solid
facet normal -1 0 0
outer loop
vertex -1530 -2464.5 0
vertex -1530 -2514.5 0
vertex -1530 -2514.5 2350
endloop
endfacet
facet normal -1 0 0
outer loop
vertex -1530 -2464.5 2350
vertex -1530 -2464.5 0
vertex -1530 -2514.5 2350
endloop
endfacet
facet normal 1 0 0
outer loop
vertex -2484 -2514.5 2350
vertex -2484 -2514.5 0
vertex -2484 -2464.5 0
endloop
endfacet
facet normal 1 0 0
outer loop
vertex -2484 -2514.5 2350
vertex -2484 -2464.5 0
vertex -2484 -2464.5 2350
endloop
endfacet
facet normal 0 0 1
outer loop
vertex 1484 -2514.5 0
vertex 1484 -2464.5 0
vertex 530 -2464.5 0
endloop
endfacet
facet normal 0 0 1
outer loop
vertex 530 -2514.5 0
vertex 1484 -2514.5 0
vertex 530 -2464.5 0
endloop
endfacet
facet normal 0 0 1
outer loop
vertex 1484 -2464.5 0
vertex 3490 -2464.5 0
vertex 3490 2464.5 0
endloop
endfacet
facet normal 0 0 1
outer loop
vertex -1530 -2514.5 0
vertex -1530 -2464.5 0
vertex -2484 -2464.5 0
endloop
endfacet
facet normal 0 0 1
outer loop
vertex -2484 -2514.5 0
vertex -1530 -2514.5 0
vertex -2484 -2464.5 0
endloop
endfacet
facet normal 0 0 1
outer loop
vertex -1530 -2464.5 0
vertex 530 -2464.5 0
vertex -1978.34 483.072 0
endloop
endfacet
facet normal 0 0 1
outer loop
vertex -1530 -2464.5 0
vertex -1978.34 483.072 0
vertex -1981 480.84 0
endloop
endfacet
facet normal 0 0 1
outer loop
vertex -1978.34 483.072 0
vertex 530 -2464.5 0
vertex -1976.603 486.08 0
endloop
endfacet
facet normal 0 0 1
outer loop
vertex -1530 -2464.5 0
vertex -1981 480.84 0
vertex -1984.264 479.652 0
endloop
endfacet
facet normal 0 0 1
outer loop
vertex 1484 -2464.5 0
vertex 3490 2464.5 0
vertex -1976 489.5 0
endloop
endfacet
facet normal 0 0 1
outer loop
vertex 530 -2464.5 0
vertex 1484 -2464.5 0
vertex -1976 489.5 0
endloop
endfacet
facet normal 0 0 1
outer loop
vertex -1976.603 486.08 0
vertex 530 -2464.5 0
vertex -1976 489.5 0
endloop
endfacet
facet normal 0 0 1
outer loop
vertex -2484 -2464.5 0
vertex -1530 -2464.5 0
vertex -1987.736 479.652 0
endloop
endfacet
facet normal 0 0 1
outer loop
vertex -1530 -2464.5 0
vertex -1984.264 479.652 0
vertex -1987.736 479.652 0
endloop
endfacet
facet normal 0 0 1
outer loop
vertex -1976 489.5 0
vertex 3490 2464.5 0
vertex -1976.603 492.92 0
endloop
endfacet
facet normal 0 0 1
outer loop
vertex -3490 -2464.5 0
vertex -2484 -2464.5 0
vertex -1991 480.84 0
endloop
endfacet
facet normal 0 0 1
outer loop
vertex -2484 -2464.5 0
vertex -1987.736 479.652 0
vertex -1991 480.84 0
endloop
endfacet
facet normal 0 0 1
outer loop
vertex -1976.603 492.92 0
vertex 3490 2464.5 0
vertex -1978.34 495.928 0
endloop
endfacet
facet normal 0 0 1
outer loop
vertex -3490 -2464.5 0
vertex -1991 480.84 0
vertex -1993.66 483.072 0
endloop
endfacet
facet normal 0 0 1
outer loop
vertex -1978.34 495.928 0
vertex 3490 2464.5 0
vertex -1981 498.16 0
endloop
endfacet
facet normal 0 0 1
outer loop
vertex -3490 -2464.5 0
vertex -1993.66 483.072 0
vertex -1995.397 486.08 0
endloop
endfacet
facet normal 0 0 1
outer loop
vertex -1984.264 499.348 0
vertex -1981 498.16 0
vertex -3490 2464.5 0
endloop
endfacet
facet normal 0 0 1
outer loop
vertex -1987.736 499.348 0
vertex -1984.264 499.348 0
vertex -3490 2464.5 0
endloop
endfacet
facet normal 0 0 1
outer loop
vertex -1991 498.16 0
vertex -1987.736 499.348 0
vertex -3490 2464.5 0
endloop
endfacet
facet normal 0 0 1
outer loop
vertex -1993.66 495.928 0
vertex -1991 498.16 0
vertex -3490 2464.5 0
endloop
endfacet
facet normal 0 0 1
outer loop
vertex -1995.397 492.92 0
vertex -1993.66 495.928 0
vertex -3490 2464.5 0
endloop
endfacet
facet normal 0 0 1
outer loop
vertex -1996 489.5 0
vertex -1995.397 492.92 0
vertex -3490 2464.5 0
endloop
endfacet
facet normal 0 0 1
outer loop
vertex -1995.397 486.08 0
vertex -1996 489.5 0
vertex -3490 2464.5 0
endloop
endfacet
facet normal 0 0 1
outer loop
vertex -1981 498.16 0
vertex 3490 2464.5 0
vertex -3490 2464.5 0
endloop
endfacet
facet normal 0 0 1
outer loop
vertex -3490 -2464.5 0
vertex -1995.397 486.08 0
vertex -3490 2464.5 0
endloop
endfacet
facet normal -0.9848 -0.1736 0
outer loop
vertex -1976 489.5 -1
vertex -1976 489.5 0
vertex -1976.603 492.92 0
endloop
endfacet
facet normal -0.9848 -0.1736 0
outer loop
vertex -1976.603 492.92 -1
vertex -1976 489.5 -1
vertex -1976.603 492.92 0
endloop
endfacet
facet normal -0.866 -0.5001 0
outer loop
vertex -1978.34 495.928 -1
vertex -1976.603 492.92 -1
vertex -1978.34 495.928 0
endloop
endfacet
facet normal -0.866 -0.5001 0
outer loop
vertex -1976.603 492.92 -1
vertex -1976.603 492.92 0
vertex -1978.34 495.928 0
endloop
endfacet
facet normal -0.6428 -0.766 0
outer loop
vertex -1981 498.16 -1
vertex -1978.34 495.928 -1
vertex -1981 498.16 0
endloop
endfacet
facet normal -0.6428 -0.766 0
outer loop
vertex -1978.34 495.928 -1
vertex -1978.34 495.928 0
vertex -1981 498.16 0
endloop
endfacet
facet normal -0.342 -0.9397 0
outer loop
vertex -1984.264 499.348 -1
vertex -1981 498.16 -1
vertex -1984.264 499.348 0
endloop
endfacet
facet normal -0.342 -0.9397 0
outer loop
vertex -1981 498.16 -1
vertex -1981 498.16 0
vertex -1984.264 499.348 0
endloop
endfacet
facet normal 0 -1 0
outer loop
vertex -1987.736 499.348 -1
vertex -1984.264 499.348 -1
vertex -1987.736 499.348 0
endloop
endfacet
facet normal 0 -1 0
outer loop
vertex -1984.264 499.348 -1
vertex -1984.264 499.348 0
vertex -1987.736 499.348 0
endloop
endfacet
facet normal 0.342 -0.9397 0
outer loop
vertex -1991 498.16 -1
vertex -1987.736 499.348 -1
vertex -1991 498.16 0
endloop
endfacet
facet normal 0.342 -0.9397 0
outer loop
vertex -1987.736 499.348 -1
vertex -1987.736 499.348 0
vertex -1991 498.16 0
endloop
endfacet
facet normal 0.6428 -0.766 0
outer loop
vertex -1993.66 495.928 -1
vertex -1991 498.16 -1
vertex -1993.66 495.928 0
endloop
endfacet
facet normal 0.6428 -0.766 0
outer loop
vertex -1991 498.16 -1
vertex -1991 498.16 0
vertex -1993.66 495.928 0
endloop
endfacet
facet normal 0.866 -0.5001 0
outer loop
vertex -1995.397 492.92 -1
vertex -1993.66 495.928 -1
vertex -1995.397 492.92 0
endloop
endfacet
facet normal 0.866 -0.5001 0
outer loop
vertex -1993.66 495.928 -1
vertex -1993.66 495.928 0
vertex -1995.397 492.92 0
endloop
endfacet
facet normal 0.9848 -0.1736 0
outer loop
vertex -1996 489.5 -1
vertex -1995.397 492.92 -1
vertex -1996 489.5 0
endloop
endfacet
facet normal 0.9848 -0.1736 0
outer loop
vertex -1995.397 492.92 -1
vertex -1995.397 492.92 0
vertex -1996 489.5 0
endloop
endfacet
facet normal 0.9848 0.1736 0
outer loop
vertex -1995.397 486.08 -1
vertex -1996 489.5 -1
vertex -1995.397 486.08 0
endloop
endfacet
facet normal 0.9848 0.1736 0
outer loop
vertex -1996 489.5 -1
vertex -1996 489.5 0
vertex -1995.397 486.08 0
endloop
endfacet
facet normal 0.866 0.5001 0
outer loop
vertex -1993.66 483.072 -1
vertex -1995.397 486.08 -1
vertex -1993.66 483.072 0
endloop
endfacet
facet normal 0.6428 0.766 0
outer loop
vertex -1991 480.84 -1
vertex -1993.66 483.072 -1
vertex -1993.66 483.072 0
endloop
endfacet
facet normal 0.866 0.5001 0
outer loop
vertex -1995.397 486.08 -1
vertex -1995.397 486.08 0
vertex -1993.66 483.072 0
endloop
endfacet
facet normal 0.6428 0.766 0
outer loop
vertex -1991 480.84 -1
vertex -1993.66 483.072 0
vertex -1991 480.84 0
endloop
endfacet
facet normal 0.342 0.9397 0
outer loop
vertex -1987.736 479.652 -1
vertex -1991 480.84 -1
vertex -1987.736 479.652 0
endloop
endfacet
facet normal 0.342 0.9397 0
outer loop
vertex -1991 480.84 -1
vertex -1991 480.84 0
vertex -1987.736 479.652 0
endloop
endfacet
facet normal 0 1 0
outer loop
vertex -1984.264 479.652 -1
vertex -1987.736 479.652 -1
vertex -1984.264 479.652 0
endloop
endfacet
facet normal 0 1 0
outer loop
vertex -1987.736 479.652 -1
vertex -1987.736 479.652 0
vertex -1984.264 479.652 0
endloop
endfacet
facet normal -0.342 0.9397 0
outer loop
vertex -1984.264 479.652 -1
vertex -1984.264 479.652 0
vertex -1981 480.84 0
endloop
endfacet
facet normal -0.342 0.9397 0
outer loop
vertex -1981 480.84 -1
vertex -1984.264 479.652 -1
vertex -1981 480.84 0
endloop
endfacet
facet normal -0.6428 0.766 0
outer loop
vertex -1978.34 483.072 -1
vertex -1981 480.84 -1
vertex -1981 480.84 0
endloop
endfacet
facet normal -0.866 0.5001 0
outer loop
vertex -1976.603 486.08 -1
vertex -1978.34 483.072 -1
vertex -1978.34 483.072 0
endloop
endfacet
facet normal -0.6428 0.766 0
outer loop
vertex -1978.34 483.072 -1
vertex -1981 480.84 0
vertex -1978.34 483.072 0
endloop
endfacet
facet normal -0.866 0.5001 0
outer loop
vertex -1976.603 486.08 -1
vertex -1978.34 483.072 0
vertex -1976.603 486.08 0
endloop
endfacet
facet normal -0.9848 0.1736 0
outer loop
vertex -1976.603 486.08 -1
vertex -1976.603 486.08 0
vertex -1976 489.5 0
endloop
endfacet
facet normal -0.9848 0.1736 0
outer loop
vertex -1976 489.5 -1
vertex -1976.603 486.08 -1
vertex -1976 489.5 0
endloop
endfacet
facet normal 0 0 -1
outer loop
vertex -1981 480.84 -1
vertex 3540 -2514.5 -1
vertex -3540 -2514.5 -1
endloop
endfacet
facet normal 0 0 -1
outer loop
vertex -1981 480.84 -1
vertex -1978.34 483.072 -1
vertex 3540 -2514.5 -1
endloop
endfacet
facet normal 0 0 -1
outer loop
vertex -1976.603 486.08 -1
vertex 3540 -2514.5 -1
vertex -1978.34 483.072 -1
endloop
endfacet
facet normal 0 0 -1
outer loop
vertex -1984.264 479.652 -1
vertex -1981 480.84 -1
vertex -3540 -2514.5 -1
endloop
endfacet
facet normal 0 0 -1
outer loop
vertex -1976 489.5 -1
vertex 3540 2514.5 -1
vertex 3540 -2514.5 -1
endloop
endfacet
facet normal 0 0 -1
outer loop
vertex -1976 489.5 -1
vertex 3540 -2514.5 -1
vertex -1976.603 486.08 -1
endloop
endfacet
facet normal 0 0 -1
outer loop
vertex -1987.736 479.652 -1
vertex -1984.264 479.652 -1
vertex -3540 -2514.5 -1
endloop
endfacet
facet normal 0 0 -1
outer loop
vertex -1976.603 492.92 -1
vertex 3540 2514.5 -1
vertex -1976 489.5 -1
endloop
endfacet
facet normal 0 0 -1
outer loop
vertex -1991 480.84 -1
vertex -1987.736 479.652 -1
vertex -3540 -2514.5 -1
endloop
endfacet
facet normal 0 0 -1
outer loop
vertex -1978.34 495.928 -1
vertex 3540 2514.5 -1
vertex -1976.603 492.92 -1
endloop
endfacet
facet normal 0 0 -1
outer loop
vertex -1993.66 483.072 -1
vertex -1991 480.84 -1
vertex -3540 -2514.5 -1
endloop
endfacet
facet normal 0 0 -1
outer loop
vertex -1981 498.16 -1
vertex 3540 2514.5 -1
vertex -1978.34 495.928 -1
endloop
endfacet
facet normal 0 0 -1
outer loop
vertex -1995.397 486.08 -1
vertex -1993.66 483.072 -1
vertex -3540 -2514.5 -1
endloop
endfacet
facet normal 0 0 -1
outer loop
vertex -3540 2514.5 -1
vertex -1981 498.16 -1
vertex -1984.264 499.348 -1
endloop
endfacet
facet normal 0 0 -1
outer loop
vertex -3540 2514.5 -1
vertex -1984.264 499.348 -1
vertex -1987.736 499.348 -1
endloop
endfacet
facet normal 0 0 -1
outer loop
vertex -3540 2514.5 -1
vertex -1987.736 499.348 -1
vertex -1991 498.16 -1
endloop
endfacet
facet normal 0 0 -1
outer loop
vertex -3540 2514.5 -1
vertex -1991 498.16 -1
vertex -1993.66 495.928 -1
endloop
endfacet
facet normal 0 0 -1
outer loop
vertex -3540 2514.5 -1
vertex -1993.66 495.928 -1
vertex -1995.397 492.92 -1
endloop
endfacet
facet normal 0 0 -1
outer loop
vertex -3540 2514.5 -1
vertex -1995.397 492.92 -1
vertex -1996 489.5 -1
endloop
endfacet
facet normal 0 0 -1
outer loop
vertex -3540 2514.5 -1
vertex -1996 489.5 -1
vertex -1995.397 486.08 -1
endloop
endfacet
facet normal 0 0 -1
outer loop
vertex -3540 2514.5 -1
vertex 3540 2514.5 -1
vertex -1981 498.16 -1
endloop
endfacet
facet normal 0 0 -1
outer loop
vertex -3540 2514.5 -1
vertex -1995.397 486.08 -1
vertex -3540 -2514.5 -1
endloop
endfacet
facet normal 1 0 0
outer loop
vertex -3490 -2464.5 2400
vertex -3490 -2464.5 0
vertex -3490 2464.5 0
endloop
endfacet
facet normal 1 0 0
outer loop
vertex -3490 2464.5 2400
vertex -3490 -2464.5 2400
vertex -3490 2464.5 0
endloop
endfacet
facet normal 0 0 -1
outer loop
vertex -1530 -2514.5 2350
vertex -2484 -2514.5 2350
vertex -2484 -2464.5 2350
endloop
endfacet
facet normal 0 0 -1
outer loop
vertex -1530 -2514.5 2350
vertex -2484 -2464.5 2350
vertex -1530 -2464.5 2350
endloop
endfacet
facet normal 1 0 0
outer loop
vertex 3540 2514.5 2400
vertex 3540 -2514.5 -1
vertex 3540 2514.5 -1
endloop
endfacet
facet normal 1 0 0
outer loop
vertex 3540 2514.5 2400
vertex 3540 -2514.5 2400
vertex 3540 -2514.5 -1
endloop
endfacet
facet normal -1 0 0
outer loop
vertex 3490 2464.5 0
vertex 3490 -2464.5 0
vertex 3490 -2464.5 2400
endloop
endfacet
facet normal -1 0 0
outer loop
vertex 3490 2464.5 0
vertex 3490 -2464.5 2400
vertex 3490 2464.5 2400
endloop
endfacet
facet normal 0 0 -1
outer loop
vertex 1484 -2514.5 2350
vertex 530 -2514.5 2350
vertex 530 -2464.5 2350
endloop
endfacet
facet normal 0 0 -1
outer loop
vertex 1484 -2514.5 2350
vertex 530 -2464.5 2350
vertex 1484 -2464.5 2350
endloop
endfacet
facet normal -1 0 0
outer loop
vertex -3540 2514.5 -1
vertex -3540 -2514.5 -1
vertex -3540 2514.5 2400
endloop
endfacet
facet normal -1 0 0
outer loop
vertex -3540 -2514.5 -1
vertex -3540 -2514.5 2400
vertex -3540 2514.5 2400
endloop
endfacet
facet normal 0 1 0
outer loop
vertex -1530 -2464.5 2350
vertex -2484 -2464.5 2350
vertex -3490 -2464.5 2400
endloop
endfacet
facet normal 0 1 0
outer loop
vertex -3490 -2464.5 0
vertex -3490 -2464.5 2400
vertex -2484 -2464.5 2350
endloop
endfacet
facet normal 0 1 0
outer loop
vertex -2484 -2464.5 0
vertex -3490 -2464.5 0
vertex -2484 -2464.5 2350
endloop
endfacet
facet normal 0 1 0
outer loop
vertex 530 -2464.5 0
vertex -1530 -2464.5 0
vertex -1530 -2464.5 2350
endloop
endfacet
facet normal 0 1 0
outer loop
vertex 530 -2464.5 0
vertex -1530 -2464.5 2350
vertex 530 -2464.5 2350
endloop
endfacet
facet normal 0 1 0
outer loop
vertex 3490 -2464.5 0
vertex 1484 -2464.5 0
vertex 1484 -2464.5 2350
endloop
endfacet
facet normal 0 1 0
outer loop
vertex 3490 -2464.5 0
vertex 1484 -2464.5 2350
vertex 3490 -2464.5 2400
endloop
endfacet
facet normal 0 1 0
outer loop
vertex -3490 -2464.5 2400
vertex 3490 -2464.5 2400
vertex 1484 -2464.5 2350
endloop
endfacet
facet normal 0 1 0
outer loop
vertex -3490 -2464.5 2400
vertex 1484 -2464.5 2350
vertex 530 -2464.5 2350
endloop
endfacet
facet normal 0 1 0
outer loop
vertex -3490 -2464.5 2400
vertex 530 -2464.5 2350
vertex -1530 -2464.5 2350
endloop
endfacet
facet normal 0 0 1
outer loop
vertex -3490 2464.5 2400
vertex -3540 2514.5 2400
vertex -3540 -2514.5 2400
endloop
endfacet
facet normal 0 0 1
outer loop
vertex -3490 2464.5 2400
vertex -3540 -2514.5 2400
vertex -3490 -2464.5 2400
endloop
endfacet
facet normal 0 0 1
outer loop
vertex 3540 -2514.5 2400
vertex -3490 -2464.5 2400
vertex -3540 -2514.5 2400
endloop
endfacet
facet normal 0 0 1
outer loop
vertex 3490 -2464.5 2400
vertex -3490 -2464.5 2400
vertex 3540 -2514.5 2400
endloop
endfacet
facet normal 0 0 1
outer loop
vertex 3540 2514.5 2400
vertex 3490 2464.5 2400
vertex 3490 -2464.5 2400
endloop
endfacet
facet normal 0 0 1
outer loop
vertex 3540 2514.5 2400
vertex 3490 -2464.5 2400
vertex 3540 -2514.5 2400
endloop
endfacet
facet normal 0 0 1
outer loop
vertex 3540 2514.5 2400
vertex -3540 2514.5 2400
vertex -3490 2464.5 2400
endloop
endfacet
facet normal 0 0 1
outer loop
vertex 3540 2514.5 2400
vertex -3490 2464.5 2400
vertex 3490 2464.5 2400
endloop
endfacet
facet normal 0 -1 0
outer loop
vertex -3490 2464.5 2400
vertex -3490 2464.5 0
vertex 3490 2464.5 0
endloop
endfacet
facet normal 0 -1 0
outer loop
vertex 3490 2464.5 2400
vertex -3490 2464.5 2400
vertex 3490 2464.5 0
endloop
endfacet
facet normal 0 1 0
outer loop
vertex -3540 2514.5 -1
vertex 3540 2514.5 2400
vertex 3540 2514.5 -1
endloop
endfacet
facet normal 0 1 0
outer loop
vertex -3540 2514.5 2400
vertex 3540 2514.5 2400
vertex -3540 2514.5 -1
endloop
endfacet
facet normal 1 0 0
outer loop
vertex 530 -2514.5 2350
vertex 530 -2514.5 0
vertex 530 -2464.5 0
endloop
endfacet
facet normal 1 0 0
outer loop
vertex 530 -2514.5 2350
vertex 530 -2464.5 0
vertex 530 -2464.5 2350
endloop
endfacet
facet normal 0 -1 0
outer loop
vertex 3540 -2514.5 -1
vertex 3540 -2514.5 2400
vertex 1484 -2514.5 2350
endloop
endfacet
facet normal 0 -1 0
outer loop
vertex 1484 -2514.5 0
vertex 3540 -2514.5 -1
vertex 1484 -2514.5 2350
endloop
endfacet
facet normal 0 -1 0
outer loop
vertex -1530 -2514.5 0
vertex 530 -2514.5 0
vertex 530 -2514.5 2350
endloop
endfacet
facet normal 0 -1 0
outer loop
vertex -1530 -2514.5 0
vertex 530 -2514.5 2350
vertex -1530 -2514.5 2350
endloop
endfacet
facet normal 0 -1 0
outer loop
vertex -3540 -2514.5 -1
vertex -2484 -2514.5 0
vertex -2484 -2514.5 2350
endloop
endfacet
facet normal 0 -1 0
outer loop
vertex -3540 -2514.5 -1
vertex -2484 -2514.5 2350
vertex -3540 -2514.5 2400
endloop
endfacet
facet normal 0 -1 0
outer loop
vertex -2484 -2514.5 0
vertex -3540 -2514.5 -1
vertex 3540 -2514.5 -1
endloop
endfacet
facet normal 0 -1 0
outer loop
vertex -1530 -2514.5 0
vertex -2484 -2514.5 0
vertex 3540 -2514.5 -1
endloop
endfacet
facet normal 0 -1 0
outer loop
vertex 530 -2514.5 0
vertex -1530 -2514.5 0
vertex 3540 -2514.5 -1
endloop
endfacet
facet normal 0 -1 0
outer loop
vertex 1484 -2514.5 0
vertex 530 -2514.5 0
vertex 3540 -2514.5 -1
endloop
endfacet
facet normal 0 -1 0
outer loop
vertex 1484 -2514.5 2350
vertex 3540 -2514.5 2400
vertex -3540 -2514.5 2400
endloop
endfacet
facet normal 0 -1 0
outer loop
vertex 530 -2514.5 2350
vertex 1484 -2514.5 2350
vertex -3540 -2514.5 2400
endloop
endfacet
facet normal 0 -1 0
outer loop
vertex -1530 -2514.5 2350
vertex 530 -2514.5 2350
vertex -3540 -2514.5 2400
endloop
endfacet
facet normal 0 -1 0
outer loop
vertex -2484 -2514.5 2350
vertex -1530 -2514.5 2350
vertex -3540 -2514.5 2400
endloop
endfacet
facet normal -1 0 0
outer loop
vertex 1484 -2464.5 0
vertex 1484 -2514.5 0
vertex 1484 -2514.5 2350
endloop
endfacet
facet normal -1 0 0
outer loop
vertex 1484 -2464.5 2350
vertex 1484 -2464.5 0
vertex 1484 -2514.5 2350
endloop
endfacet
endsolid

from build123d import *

# Parameters (mm, degrees)
CROQUIS1_W              = 7080
CROQUIS1_H              = 5029
CROQUIS1_W_2            = 6980
CROQUIS1_H_2            = 4929
SALIENTE_EXTRUIR1_DEPTH = 2400
CORTAR_EXTRUIR1_REACH   = 5031
CROQUIS2_W              = 954
CROQUIS2_H              = 2350
CROQUIS3_W              = 7080
CROQUIS3_H              = 5029
SALIENTE_EXTRUIR2_DEPTH = 1
CORTAR_EXTRUIR2_REACH   = 3
CROQUIS4_R              = 10


with BuildPart() as part:
    # Croquis1 → Saliente-Extruir1 (new body)
    with BuildSketch(Plane.XY):
        Rectangle(CROQUIS1_W, CROQUIS1_H)
        Rectangle(CROQUIS1_W_2, CROQUIS1_H_2, mode=Mode.SUBTRACT)
    extrude(amount=SALIENTE_EXTRUIR1_DEPTH)

    # Croquis2 → Cortar-Extruir1 (cut, up to next)
    with BuildSketch(Plane.XZ.offset(2514.5), mode=Mode.PRIVATE) as cortar_extruir1_sk1:
        with Locations((-2007, 1175)):
            Rectangle(CROQUIS2_W, CROQUIS2_H)
    cortar_extruir1_tool1 = extrude(cortar_extruir1_sk1.sketch, amount=-CORTAR_EXTRUIR1_REACH, mode=Mode.PRIVATE) & part.part
    add(cortar_extruir1_tool1.solids().sort_by_distance((-2007, -2514.5, 1175))[0], mode=Mode.SUBTRACT)
    # Croquis2 → Cortar-Extruir1 (cut, up to next)
    with BuildSketch(Plane.XZ.offset(2514.5), mode=Mode.PRIVATE) as cortar_extruir1_sk2:
        with Locations((1007, 1175)):
            Rectangle(CROQUIS2_W, CROQUIS2_H)
    cortar_extruir1_tool2 = extrude(cortar_extruir1_sk2.sketch, amount=-CORTAR_EXTRUIR1_REACH, mode=Mode.PRIVATE) & part.part
    add(cortar_extruir1_tool2.solids().sort_by_distance((1007, -2514.5, 1175))[0], mode=Mode.SUBTRACT)

    # Croquis3 → Saliente-Extruir2 (add)
    with BuildSketch(Plane(origin=(0, 0, 0), x_dir=(-1, 0, 0), z_dir=(0, 0, -1))):
        Rectangle(CROQUIS3_W, CROQUIS3_H)
    extrude(amount=SALIENTE_EXTRUIR2_DEPTH)

    # Croquis4 → Cortar-Extruir2 (cut, up to next)
    with BuildSketch(Plane.XY, mode=Mode.PRIVATE) as cortar_extruir2_sk1:
        with Locations((-1986, 489.5)):
            Circle(CROQUIS4_R)
    cortar_extruir2_tool1 = extrude(cortar_extruir2_sk1.sketch, amount=-CORTAR_EXTRUIR2_REACH, mode=Mode.PRIVATE) & part.part
    add(cortar_extruir2_tool1.solids().sort_by_distance((-1986, 489.5, 0))[0], mode=Mode.SUBTRACT)


solid = part.part
